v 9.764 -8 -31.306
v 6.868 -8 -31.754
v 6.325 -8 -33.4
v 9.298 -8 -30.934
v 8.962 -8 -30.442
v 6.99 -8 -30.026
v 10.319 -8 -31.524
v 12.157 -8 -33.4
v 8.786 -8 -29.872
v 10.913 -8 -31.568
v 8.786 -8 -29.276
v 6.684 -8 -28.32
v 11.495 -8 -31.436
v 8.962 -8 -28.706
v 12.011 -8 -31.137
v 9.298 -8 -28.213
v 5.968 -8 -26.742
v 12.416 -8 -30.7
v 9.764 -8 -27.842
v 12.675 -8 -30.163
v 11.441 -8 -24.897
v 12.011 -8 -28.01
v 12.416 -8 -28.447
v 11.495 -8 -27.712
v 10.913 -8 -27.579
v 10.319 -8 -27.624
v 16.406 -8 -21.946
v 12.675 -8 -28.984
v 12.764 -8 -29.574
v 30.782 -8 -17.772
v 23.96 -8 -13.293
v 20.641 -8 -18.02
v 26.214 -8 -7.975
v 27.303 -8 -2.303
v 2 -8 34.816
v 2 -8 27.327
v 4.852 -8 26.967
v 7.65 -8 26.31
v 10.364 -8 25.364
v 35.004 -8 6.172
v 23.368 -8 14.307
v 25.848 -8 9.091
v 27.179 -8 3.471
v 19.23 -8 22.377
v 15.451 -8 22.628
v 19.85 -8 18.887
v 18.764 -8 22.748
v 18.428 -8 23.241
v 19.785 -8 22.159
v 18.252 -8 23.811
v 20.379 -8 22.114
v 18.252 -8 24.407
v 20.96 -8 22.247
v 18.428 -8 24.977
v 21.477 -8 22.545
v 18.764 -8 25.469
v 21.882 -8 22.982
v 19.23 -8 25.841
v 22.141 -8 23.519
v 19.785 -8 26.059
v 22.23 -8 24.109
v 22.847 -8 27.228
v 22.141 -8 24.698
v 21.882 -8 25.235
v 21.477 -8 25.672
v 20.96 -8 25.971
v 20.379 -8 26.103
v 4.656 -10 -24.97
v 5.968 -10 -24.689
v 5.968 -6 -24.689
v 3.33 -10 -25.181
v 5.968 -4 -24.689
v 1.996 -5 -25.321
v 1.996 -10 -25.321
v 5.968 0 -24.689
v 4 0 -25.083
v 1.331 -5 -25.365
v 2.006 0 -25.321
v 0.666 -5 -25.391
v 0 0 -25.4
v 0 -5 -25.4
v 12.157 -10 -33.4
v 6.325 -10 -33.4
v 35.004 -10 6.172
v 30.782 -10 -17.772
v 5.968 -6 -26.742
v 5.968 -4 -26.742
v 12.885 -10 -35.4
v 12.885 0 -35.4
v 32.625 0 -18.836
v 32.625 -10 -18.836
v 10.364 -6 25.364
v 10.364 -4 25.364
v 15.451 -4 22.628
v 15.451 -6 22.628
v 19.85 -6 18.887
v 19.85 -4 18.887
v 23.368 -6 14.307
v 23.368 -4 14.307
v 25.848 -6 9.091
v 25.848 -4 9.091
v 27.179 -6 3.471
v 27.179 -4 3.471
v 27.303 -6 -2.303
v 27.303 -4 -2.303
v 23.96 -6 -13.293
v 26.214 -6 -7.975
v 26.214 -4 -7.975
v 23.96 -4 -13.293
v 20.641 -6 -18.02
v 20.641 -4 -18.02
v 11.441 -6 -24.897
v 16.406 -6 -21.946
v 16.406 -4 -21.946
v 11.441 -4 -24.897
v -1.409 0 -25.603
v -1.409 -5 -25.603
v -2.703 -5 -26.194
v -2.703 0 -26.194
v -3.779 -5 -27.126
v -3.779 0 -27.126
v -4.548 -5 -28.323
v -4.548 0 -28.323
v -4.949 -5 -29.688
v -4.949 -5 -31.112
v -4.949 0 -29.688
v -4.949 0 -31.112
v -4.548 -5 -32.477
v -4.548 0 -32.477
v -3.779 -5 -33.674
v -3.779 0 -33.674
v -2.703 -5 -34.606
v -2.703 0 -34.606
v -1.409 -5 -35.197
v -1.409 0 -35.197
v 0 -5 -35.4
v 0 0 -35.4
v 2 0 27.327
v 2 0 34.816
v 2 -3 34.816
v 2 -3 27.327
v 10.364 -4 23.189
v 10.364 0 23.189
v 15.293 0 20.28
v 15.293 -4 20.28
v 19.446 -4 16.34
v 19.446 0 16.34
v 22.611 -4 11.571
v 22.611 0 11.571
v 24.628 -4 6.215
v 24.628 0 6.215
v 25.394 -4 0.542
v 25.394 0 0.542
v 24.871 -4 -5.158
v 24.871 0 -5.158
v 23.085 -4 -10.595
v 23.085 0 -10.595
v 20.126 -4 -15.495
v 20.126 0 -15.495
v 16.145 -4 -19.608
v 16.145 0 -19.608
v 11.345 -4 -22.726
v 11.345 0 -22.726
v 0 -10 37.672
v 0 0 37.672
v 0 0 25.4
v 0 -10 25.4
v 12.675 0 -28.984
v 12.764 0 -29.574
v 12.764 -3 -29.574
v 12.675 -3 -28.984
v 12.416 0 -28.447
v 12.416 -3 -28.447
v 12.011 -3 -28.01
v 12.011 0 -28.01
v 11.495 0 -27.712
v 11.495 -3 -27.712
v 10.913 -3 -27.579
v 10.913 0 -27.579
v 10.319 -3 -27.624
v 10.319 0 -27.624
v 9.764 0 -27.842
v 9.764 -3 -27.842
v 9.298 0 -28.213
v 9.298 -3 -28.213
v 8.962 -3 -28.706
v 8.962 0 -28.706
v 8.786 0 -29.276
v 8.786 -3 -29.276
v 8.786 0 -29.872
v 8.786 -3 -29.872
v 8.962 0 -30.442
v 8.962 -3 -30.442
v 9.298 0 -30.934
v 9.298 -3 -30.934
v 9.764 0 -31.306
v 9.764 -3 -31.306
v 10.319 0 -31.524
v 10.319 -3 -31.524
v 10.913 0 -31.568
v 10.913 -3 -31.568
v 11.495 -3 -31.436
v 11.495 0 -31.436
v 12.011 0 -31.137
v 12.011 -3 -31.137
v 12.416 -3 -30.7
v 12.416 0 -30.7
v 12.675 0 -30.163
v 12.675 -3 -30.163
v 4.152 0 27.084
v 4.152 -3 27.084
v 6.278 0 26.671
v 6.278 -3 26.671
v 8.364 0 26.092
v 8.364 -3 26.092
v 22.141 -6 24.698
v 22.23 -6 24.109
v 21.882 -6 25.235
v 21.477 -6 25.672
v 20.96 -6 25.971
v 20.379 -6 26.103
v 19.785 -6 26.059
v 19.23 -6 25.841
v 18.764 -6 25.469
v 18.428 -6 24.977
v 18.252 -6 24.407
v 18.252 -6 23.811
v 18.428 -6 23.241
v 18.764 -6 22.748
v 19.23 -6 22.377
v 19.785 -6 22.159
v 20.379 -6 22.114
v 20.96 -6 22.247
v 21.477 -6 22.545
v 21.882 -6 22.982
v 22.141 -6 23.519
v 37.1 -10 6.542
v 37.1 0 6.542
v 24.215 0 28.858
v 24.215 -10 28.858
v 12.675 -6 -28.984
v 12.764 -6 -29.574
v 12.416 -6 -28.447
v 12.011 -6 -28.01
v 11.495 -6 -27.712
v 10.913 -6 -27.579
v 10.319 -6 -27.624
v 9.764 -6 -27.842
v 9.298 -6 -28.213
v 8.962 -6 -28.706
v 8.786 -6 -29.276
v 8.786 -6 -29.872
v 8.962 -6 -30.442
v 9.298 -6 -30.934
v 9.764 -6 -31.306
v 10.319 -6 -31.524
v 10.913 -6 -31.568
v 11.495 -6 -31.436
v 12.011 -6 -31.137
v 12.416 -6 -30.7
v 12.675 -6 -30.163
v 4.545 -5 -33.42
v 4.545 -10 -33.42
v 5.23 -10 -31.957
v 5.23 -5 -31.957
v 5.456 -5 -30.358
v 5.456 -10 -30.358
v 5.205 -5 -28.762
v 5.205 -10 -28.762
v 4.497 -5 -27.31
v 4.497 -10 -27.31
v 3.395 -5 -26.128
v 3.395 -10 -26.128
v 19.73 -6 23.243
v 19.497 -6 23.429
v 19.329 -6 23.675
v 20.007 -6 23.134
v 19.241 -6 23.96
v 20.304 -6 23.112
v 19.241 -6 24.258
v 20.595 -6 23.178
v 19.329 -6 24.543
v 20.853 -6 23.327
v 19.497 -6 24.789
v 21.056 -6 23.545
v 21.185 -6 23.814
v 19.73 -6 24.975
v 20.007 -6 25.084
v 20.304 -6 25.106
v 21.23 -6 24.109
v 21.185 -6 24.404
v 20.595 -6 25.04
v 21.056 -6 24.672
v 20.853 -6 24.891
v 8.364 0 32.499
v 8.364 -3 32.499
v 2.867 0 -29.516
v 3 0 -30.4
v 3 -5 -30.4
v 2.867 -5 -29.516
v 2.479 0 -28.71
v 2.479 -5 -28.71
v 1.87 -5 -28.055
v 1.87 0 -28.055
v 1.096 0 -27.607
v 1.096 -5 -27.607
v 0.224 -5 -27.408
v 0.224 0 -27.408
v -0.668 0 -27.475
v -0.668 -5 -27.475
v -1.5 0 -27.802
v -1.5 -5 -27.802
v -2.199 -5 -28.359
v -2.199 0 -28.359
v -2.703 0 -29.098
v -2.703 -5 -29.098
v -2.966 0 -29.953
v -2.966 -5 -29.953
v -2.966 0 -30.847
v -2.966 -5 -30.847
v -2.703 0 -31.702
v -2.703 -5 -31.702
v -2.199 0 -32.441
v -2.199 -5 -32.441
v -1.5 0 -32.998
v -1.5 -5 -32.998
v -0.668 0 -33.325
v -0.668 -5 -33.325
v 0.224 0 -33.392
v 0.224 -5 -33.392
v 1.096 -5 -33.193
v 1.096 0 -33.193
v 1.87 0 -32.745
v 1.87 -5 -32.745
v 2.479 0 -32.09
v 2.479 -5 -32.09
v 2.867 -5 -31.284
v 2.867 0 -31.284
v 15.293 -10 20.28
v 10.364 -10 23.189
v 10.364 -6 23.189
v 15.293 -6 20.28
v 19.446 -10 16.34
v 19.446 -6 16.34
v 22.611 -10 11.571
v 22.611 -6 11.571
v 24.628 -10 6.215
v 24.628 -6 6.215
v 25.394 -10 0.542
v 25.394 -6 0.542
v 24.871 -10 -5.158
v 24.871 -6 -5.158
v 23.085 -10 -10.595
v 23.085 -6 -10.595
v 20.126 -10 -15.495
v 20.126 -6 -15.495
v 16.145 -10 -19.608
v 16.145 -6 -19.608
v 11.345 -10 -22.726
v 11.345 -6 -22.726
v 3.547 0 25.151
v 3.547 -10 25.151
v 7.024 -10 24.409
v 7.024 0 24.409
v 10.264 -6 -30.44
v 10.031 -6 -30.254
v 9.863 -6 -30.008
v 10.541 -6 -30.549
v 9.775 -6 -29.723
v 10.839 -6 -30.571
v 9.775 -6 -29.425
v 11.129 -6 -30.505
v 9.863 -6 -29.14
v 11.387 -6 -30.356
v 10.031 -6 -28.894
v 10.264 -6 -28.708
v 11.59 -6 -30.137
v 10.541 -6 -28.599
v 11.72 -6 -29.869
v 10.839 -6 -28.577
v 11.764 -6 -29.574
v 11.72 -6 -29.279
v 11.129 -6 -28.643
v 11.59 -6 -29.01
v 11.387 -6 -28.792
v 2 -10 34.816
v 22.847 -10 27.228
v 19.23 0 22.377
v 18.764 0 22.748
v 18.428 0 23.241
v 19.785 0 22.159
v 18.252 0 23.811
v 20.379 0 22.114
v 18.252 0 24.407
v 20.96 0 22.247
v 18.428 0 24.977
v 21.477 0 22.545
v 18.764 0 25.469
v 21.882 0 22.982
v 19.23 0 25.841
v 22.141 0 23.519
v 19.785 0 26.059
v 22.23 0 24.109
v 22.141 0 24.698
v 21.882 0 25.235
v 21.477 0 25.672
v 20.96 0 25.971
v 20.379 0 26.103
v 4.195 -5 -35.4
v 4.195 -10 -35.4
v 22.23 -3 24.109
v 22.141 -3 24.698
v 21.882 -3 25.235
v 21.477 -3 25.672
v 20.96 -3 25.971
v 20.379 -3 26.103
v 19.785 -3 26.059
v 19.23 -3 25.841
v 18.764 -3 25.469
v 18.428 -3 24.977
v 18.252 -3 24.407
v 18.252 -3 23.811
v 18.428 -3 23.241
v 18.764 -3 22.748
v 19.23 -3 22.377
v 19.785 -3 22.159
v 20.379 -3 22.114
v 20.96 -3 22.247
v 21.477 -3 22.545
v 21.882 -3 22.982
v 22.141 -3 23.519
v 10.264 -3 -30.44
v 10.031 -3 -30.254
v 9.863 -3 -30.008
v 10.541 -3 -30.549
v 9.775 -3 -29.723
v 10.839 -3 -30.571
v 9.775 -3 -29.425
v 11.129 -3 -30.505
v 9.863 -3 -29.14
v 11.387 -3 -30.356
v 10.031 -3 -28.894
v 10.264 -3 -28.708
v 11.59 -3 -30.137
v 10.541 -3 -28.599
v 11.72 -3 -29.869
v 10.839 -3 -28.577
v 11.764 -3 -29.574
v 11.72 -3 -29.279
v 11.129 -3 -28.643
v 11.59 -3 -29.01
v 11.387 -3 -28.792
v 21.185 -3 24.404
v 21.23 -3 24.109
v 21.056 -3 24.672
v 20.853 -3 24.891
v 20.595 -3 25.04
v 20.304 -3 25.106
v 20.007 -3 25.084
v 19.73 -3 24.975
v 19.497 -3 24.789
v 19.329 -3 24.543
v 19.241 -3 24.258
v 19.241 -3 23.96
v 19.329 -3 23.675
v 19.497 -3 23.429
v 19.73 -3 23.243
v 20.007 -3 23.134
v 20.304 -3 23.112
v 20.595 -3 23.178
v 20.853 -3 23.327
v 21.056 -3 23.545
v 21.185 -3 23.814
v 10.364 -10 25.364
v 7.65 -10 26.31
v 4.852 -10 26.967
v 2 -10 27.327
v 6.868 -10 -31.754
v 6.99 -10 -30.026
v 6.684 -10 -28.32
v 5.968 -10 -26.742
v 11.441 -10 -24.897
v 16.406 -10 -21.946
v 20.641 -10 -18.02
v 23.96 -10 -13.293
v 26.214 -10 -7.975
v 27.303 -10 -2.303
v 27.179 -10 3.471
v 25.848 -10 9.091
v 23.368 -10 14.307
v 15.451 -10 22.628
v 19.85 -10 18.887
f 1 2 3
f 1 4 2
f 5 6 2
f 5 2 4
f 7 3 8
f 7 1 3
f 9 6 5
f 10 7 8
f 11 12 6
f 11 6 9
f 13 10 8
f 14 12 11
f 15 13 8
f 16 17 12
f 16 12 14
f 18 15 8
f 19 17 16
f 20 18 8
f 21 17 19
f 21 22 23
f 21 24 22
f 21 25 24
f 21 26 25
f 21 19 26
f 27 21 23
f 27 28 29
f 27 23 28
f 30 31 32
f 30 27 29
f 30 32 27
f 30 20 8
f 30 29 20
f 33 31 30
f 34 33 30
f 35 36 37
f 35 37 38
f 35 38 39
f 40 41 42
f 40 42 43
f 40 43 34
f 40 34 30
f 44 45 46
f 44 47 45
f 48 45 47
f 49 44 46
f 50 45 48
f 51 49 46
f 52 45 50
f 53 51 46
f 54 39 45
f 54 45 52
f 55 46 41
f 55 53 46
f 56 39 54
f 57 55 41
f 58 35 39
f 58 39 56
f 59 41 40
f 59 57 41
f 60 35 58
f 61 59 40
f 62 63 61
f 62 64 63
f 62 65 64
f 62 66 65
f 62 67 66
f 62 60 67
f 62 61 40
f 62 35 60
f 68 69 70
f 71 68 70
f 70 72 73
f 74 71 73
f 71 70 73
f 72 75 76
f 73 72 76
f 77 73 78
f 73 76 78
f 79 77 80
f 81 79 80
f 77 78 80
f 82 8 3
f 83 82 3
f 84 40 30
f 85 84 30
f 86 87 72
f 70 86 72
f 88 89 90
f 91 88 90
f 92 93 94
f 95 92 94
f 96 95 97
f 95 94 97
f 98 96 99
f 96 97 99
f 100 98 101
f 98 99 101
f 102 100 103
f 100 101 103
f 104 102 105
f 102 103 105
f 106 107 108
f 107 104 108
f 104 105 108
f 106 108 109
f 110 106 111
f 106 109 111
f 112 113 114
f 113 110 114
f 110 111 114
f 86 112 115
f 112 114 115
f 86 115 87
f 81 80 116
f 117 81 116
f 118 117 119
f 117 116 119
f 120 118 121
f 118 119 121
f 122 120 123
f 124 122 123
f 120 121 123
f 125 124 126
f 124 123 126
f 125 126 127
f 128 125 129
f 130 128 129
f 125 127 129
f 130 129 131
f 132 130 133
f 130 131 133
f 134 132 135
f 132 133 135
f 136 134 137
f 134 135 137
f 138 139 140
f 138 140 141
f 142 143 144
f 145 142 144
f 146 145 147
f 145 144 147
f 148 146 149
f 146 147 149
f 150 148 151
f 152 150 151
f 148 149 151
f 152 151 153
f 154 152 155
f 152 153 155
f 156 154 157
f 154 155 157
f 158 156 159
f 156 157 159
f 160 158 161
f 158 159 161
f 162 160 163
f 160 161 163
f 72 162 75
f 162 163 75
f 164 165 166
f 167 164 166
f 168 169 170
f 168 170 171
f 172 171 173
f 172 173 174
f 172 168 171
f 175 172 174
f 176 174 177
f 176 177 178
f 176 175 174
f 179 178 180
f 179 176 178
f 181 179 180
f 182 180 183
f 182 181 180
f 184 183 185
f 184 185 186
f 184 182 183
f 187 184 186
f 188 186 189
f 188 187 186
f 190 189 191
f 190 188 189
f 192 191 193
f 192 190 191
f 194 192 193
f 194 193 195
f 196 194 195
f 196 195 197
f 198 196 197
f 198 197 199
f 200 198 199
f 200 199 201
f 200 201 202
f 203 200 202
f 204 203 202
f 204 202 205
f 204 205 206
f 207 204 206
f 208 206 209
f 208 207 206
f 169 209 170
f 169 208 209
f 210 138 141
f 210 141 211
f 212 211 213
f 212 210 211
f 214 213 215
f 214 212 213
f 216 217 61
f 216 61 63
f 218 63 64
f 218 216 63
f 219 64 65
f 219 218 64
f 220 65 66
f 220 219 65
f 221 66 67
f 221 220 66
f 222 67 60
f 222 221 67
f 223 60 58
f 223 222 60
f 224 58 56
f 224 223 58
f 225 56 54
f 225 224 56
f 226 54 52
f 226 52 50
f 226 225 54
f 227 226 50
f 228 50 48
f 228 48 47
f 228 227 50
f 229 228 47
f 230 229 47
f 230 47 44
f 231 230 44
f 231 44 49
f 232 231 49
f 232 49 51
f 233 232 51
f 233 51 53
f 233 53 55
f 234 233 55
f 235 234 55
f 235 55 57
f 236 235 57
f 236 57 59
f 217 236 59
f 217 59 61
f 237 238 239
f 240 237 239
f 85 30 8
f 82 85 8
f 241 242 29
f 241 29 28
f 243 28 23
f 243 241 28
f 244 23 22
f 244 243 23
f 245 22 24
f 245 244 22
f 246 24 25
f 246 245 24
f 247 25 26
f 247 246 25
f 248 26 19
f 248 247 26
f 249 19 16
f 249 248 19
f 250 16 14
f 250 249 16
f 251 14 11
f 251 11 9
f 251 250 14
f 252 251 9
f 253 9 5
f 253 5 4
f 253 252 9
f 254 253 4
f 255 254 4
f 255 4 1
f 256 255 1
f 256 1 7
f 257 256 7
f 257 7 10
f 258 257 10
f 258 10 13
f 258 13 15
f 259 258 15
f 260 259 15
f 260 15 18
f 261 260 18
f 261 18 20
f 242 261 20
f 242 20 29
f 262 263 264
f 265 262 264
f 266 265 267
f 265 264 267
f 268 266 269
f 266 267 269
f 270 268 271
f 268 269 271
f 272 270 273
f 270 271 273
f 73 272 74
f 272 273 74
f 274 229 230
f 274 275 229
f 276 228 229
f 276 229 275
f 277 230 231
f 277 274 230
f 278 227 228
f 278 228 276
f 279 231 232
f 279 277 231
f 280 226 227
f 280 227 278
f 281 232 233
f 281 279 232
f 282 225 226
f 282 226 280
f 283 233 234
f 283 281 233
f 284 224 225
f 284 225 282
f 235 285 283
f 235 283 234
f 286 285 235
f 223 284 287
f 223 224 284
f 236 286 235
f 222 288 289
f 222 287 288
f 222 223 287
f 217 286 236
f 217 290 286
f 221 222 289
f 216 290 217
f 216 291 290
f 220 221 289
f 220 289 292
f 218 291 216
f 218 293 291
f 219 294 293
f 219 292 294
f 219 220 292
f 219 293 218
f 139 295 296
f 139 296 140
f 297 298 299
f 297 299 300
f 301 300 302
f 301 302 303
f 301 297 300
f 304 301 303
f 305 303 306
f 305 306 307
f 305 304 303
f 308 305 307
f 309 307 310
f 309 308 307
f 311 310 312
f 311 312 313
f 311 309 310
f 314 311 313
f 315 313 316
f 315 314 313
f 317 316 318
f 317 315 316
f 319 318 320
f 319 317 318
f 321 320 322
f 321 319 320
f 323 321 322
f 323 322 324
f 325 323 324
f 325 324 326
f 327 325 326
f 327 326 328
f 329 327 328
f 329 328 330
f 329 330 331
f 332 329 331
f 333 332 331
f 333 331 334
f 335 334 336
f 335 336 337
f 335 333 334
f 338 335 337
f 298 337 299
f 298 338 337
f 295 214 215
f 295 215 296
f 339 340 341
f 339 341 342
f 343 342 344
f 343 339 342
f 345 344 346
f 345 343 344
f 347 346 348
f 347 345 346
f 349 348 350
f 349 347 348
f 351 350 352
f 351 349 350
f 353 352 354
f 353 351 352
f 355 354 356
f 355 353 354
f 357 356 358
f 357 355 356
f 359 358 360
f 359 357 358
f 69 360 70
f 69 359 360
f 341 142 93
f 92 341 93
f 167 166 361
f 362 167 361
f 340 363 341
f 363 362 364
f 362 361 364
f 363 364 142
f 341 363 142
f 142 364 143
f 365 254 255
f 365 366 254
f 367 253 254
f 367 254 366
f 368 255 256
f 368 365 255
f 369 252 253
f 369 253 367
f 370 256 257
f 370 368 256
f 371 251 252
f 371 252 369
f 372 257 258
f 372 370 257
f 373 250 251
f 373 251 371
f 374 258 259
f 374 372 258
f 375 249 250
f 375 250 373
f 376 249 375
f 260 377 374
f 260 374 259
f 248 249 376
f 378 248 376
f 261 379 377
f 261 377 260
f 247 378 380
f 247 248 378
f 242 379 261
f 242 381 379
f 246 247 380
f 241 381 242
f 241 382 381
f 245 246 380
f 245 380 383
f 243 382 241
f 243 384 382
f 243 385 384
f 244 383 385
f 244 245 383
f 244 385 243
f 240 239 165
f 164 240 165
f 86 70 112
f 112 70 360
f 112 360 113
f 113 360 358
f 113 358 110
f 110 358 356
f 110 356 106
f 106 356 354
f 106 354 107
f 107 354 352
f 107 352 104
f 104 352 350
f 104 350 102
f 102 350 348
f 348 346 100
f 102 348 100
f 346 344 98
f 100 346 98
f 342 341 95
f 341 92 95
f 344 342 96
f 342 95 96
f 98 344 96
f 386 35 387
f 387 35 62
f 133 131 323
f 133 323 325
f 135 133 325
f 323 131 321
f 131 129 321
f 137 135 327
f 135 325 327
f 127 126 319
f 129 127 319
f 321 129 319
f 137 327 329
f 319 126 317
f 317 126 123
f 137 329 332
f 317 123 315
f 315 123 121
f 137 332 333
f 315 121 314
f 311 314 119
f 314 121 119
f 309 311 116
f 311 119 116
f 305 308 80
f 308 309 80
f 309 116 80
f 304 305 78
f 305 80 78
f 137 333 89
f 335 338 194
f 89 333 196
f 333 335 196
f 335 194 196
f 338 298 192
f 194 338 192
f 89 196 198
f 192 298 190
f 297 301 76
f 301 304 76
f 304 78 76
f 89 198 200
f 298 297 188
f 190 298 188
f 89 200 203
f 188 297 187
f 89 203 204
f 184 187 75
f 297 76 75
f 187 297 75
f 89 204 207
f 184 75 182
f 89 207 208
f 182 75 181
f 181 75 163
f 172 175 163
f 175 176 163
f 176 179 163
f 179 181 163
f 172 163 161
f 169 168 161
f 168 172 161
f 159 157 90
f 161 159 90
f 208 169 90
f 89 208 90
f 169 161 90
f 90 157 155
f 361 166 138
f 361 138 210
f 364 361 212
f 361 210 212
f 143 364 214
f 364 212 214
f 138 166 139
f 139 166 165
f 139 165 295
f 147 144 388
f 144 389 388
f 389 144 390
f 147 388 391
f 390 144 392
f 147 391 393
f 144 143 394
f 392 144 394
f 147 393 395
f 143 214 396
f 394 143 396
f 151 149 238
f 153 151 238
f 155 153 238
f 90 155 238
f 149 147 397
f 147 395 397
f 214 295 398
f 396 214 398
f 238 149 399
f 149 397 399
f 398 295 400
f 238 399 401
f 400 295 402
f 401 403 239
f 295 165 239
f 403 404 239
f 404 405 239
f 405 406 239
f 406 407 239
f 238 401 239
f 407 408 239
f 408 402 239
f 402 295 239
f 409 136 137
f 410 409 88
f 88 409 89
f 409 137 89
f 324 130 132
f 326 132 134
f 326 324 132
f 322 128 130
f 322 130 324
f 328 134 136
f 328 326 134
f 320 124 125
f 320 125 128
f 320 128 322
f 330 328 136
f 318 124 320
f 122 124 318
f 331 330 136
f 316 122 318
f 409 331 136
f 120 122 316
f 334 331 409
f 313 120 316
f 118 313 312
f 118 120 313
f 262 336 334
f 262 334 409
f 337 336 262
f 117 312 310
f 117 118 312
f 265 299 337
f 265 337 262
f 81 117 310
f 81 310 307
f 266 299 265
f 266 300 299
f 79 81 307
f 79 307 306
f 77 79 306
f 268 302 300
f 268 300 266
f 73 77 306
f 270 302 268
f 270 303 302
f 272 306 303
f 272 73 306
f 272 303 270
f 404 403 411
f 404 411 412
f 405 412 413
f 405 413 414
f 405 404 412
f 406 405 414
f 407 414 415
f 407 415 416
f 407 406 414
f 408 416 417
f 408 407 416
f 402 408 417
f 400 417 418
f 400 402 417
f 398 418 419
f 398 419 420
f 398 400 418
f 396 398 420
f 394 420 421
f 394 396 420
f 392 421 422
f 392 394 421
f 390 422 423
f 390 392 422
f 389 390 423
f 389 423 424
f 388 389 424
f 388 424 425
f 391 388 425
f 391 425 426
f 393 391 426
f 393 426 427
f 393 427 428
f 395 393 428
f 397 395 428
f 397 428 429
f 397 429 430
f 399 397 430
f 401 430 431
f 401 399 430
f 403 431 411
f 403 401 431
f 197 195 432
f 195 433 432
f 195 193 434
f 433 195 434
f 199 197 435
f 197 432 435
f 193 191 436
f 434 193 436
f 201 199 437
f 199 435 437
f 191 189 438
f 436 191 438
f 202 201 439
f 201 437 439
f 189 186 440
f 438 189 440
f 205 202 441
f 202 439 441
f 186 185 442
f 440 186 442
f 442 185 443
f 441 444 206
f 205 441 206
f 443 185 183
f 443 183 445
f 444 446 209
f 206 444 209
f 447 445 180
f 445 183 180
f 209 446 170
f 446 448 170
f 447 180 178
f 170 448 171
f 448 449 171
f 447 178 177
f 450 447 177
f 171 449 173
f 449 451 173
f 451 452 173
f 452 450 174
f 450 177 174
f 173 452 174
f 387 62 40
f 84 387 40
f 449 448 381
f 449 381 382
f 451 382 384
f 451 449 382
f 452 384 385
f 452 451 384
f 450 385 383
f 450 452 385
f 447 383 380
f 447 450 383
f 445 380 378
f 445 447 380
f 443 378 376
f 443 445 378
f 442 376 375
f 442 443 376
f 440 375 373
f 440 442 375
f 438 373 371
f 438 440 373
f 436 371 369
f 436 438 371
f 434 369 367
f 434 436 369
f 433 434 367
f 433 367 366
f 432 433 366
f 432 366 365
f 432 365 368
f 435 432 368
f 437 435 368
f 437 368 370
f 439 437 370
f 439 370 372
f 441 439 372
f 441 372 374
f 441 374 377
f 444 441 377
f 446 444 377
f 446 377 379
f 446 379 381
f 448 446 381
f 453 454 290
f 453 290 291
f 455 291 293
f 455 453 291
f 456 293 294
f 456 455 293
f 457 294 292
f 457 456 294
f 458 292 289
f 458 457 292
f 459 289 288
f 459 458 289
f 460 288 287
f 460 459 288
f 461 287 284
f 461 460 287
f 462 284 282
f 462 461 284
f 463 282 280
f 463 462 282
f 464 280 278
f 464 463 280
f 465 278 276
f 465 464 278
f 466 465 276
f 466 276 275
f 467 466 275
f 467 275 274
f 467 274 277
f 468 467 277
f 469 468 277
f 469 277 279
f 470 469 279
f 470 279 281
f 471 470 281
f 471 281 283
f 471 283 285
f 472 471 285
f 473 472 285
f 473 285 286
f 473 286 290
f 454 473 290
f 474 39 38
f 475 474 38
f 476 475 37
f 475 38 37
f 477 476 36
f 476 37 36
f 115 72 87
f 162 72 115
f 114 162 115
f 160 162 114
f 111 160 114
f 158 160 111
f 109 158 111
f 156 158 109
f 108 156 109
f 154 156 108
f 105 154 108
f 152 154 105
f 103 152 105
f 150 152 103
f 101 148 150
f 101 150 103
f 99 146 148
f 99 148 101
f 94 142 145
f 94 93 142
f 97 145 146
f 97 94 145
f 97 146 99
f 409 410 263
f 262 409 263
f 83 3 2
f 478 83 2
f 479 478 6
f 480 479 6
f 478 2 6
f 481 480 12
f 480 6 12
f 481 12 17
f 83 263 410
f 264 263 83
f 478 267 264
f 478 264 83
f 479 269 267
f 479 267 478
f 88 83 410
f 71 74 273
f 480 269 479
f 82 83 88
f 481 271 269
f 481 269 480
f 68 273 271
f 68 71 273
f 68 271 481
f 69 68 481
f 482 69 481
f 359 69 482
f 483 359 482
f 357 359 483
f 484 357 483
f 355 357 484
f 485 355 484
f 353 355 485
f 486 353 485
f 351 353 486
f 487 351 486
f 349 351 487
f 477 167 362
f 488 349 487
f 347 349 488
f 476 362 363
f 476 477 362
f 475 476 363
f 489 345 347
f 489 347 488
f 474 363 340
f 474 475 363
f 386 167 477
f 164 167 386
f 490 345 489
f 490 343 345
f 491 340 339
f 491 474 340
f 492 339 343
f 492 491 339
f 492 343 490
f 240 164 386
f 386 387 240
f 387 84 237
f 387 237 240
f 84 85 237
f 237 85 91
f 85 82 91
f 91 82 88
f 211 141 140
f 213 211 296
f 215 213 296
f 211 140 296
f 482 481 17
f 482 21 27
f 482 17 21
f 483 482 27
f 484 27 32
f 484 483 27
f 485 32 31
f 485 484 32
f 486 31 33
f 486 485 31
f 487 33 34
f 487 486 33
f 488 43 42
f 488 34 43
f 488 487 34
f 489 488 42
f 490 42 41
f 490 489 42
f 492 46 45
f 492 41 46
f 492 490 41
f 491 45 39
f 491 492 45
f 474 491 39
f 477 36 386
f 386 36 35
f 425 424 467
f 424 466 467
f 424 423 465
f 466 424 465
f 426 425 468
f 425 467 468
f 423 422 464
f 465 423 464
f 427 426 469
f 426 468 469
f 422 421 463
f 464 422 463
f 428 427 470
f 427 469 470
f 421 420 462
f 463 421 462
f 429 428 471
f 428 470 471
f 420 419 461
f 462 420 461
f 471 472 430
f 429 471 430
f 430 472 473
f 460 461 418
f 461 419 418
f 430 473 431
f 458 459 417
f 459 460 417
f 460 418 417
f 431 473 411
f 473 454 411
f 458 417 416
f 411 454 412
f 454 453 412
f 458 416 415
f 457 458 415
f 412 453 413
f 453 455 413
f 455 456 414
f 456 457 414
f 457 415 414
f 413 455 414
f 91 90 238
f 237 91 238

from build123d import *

# Parameters (mm, degrees)
F0_R      = 3
F1_DEPTH  = 5
F2_DEPTH  = 10
F0_R_2    = 2
F3_DEPTH  = 8
F4_DEPTH  = 4
F6_DEPTH  = 4
F0_R_3    = 1
F7_DEPTH  = 6
F9_DEPTH  = 5
F10_DEPTH = 3
F12_DEPTH = 3


with BuildPart() as f1:
    # F0 (on Front) → F1 (new body)
    with BuildSketch(Plane.XZ):
        with BuildLine():
            Line((0, -35.3999999996), (2.6533119314, -35.3999999996))
            ThreePointArc((2.6533119314, -35.3999999996), (4.384153616, -33.1616546164), (5, -30.3999999996))
            ThreePointArc((5, -30.3999999996), (3.5355339059, -26.8644660937), (0, -25.3999999997))
            ThreePointArc((0, -25.3999999997), (-4.9999999999, -30.3999999996), (0, -35.3999999996))
        make_face()
        with Locations((0, -30.3999999996)):
            Circle(F0_R, mode=Mode.SUBTRACT)
    extrude(amount=F1_DEPTH)

    # F0 (on Front) → F2 (join)
    with BuildSketch(Plane.XZ):
        with BuildLine():
            Line((2.6533119314, -35.3999999996), (12.8845462929, -35.3999999996))
            Line((12.8845462929, -35.3999999996), (32.6248164724, -18.8359465726))
            Line((32.6248164724, -18.8359465726), (37.09957244, 6.5416555939))
            Line((37.09957244, 6.5416555939), (24.2150261472, 28.8583444057))
            Line((24.2150261472, 28.8583444057), (0, 37.6718931452))
            Line((0, 37.6718931452), (0, 25.3999999997))
            ThreePointArc((0, 25.3999999997), (5.2987193342, 24.841166909), (10.3642812115, 23.1892577491))
            Line((10.3642812115, 23.1892577491), (10.3642812115, 25.3641809438))
            ThreePointArc((10.3642812115, 25.3641809438), (6.2595477971, 26.6754205469), (2, 27.326909814))
            Line((2, 27.326909814), (2, 34.8155971317))
            Line((2, 34.8155971317), (22.8469455738, 27.2279294674))
            Line((22.8469455738, 27.2279294674), (35.0035513982, 6.1720705321))
            Line((35.0035513982, 6.1720705321), (30.7816065022, -17.7717688002))
            Line((30.7816065022, -17.7717688002), (12.1566058243, -33.3999999997))
            Line((12.1566058243, -33.3999999997), (6.3245553202, -33.3999999997))
            ThreePointArc((6.3245553202, -33.3999999997), (6.9899965839, -30.0259040815), (5.9682330797, -26.7421052628))
            Line((5.9682330797, -26.7421052628), (5.9682330797, -24.6888678131))
            ThreePointArc((5.9682330797, -24.6888678131), (3.0052252445, -25.2215903784), (0, -25.3999999997))
            ThreePointArc((0, -25.3999999997), (3.5355339059, -26.8644660937), (5, -30.3999999996))
            ThreePointArc((5, -30.3999999996), (4.384153616, -33.1616546164), (2.6533119314, -35.3999999996))
        make_face()
    extrude(amount=F2_DEPTH)

    # F0 (on Front) → F3 (join)
    with BuildSketch(Plane.XZ):
        with BuildLine():
            ThreePointArc((10.3642812115, 25.3641809438), (27.3030038884, -2.3034710008), (5.9682330797, -26.7421052628))
            ThreePointArc((5.9682330797, -26.7421052628), (6.9899965839, -30.0259040815), (6.3245553202, -33.3999999997))
            Line((6.3245553202, -33.3999999997), (12.1566058243, -33.3999999997))
            Line((12.1566058243, -33.3999999997), (30.7816065022, -17.7717688002))
            Line((30.7816065022, -17.7717688002), (35.0035513982, 6.1720705321))
            Line((35.0035513982, 6.1720705321), (22.8469455738, 27.2279294674))
            Line((22.8469455738, 27.2279294674), (2, 34.8155971317))
            Line((2, 34.8155971317), (2, 27.326909814))
            ThreePointArc((2, 27.326909814), (6.2595477971, 26.6754205469), (10.3642812115, 25.3641809438))
        make_face()
        with Locations((10.7639788756, -29.5737889045)):
            Circle(F0_R_2, mode=Mode.SUBTRACT)
        with Locations((27.2553512828, -15.7358844)):
            Circle(F0_R_2, mode=Mode.SUBTRACT)
        with Locations((30.9936419152, 5.4650153001)):
            Circle(F0_R_2, mode=Mode.SUBTRACT)
        with Locations((20.2296630396, 24.1087736043)):
            Circle(F0_R_2, mode=Mode.SUBTRACT)
        with Locations((30.9936419152, 5.4650153001)):
            Circle(F0_R_2)
        with Locations((27.2553512828, -15.7358844)):
            Circle(F0_R_2)
    extrude(amount=F3_DEPTH)

    # F0 (on Front) → F4 (join)
    with BuildSketch(Plane.XZ):
        with BuildLine():
            ThreePointArc((10.3642812115, 23.1892577491), (25.2936055675, -2.3223947512), (5.9682330797, -24.6888678131))
            Line((5.9682330797, -24.6888678131), (5.9682330797, -26.7421052628))
            ThreePointArc((5.9682330797, -26.7421052628), (27.3030038884, -2.3034710008), (10.3642812115, 25.3641809438))
            Line((10.3642812115, 25.3641809438), (10.3642812115, 23.1892577491))
        make_face()
    extrude(amount=F4_DEPTH)

    # F5 (on face) → F6 (join)
    with BuildSketch(Plane.XZ.offset(10)):
        with BuildLine():
            ThreePointArc((10.3642812115, 23.1892577491), (25.2936055675, -2.3223947512), (5.9682330797, -24.6888678131))
            Line((5.9682330797, -24.6888678131), (5.9682330797, -26.7421052628))
            ThreePointArc((5.9682330797, -26.7421052628), (27.3030038884, -2.3034710008), (10.3642812115, 25.3641809438))
            Line((10.3642812115, 25.3641809438), (10.3642812115, 23.1892577491))
        make_face()
    extrude(amount=-F6_DEPTH)

    # F0 (on Front) → F7 (join)
    with BuildSketch(Plane.XZ):
        with Locations((20.2296630396, 24.1087736043)):
            Circle(F0_R_2)
        with Locations((20.2296630396, 24.1087736043)):
            Circle(F0_R_3, mode=Mode.SUBTRACT)
        with Locations((10.7639788756, -29.5737889045)):
            Circle(F0_R_2)
        with Locations((10.7639788756, -29.5737889045)):
            Circle(F0_R_3, mode=Mode.SUBTRACT)
    extrude(amount=F7_DEPTH)

    # F8 (on face) → F9 (cut)
    with BuildSketch(Plane.XZ.offset(10)):
        with BuildLine():
            Line((2.6535725711, -35.3997834846), (4.1954981558, -35.3999999996))
            Line((4.1954981558, -35.3999999996), (4.5446208272, -33.4200269408))
            ThreePointArc((4.5446208272, -33.4200269408), (5.2048555211, -28.7618241261), (1.9956840643, -25.3214779407))
            ThreePointArc((1.9956840643, -25.3214779407), (0.9986141145, -25.3803618933), (0, -25.3999999997))
            ThreePointArc((0, -25.3999999997), (3.5355339059, -26.8644660937), (5, -30.3999999996))
            ThreePointArc((5, -30.3999999996), (4.9127701426, -31.4613100854), (4.6534218159, -32.4941346551))
            ThreePointArc((4.6534218159, -32.4941346551), (3.854365705, -34.0852093419), (2.6535725711, -35.3997834846))
        make_face()
        with BuildLine():
            Line((2.6533119314, -35.3999999996), (4.1954981558, -35.3999999996))
            Line((4.1954981558, -35.3999999996), (2.6535725711, -35.3997834846))
            ThreePointArc((2.6535725711, -35.3997834846), (2.6534422527, -35.3998917438), (2.6533119314, -35.3999999996))
        make_face()
        with BuildLine():
            Line((0.0760534773, -35.399421553), (2.6535725711, -35.3997834846))
            ThreePointArc((2.6535725711, -35.3997834846), (3.854365705, -34.0852093419), (4.6534218159, -32.4941346551))
            ThreePointArc((4.6534218159, -32.4941346551), (4.9127701426, -31.4613100854), (5, -30.3999999996))
            ThreePointArc((5, -30.3999999996), (3.5623213911, -33.9085419057), (0.0760534773, -35.399421553))
        make_face()
        with BuildLine():
            ThreePointArc((0, -25.3999999997), (0.9986141145, -25.3803618933), (1.9956840643, -25.3214779407))
            ThreePointArc((1.9956840643, -25.3214779407), (1.0155877723, -25.0387760102), (0, -24.943431372))
            Line((0, -24.943431372), (0, -25.3999999997))
        make_face()
    extrude(amount=-F9_DEPTH, mode=Mode.SUBTRACT)

    # F0 (on Front) → F10 (cut)
    with BuildSketch(Plane.XZ):
        with Locations((20.2296630396, 24.1087736043)):
            Circle(F0_R_2)
        with Locations((20.2296630396, 24.1087736043)):
            Circle(F0_R_3, mode=Mode.SUBTRACT)
        with Locations((10.7639788756, -29.5737889045)):
            Circle(F0_R_2)
        with Locations((10.7639788756, -29.5737889045)):
            Circle(F0_R_3, mode=Mode.SUBTRACT)
    extrude(amount=F10_DEPTH, mode=Mode.SUBTRACT)

    # F11 (on face) → F12 (cut)
    with BuildSketch(Plane.XZ):
        with BuildLine():
            Line((8.3644706756, 32.4991192489), (2, 34.8155971317))
            Line((2, 34.8155971317), (2, 27.326909814))
            ThreePointArc((2, 27.326909814), (5.2188864899, 26.8983870108), (8.3644706756, 26.0920606756))
            Line((8.3644706756, 26.0920606756), (8.3644706756, 32.4991192489))
        make_face()
    extrude(amount=F12_DEPTH, mode=Mode.SUBTRACT)


solid = f1.part
